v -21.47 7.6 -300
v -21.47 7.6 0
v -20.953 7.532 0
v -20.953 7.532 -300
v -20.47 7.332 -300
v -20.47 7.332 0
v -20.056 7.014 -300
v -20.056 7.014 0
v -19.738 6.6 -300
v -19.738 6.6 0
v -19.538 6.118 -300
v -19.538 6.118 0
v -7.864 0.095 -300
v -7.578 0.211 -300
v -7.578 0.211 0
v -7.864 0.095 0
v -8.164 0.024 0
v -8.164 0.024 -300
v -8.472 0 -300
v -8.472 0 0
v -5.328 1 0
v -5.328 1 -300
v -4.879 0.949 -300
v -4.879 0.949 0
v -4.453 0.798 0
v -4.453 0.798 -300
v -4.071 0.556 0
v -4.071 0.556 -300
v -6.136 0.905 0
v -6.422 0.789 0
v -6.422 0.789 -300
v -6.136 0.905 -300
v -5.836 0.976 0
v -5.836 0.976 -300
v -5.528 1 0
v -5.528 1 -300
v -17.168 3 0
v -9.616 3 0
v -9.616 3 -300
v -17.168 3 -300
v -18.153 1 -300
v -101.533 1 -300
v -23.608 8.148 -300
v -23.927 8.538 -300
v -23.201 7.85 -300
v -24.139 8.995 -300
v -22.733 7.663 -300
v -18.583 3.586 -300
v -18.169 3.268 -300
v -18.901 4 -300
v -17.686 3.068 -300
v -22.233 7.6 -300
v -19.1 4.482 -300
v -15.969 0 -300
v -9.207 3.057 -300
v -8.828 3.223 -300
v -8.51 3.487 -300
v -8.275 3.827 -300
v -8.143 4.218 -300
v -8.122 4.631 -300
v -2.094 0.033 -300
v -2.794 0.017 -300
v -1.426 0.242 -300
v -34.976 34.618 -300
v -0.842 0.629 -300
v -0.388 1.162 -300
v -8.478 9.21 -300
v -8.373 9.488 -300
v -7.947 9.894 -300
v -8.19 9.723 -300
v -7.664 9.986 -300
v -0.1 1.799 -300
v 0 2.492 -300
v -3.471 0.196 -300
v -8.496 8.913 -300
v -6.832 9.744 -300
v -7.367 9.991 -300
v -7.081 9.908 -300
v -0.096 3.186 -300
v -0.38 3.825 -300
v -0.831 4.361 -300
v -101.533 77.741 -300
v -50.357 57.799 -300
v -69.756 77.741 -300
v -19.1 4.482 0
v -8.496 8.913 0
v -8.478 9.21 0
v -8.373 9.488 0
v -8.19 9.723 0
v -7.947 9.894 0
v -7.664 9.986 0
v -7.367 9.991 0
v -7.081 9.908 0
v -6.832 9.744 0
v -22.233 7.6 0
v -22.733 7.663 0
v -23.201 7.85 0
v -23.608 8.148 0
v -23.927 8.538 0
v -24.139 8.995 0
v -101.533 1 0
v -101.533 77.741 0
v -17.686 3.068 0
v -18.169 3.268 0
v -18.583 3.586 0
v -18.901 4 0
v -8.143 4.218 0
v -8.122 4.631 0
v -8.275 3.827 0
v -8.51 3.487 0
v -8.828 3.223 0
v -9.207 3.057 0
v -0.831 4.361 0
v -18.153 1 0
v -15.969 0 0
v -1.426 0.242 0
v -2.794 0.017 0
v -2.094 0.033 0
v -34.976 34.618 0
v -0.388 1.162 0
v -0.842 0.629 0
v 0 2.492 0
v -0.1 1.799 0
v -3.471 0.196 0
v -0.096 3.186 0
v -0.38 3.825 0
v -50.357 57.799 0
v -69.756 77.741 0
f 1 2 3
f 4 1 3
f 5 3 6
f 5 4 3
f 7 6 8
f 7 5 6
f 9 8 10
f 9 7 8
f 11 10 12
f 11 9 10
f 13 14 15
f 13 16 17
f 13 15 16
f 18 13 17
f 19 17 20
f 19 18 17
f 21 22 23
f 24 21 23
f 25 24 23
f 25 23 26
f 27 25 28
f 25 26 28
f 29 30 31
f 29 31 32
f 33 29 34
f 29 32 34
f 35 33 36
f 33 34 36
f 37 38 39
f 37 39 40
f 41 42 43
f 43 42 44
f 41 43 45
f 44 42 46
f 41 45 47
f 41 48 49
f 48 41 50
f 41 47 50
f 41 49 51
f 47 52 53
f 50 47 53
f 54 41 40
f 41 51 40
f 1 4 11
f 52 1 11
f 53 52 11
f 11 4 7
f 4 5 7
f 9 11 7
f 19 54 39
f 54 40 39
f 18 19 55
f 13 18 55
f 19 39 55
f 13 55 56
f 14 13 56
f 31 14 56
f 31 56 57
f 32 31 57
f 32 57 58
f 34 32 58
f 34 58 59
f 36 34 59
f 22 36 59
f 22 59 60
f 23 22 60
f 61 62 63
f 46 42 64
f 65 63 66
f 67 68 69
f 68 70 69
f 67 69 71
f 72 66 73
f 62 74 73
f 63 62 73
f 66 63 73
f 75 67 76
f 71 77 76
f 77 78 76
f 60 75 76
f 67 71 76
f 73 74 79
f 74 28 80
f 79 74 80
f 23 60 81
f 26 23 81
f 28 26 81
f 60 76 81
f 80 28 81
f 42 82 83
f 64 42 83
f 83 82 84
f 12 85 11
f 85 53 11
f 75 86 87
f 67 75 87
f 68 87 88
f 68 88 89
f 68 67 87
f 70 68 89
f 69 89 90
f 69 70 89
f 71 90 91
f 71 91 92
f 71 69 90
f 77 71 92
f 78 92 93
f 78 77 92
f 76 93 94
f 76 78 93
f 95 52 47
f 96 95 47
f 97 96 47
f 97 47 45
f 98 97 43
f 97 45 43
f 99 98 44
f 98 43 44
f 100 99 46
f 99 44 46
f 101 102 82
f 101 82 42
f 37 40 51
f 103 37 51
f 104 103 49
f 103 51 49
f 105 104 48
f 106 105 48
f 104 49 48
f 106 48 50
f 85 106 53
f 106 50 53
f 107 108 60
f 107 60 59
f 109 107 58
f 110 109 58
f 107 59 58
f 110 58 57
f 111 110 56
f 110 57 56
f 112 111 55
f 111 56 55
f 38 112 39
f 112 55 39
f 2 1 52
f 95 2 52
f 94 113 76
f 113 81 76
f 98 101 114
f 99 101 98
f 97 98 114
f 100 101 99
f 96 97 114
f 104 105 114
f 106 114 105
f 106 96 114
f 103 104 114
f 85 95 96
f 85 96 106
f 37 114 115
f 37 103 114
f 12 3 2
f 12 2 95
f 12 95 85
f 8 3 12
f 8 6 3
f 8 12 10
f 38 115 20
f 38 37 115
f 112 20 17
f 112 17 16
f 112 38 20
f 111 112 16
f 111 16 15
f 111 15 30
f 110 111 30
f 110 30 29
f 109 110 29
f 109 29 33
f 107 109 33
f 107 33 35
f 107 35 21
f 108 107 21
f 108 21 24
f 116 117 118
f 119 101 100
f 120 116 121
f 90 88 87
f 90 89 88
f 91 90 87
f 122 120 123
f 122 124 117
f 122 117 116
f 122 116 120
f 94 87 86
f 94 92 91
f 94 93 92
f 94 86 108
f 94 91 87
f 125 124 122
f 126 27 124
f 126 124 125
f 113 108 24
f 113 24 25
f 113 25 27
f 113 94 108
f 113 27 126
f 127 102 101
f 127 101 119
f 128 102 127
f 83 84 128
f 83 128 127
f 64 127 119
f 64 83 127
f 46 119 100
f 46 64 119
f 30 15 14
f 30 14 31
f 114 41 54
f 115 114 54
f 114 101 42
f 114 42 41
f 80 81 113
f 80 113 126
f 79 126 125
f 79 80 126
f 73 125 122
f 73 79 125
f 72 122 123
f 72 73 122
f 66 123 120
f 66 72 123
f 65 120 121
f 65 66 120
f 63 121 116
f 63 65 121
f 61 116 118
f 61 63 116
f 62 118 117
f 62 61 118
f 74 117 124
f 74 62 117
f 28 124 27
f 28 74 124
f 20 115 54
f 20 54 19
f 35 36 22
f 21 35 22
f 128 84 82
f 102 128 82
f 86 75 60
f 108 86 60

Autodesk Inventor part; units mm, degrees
ref_plane "YZ Plane" through (0, 0, 0) normal (1, 0, 0) x (0, 1, 0)
ref_plane "XZ Plane" through (0, 0, 0) normal (0, 1, 0) x (-1, 0, 0)
ref_plane "XY Plane" through (0, 0, 0) normal (0, 0, 1) x (1, 0, 0)
sketch "草圖3" plane through (0, 0, 0) normal (0, 1, 0) x (-1, 0, 0)
  line L0 (0, 0) -> (0, -300)
  dimension "d15" = 300
sketch "草圖1" plane through (0, 0, 0) normal (0, 0, 1) x (1, 0, 0)
  line L0 (0, 0) -> (-9.6483, 0) construction
  line L1 (0, 0) -> (0, 9.3404) construction
  line L2 (-8.1216, 4.6307) -> (-8.4962, 8.9128)
  arc A0 (-6.8323, 9.7444) -> (-8.4962, 8.9128) centre (-7.5, 9) ccw
  line L3 (-6.8323, 9.7444) -> (-0.8307, 4.361)
  arc A1 (-4.5, 1) -> (-0.8307, 4.361) centre (-2.5, 2.5) ccw
  line L4 (-4.5, 1) -> (-6, 1)
  line L5 (-6, 1) -> (-8, 0)
  line L6 (-8, 0) -> (-15.9689, 0)
  line L7 (-15.9689, 0) -> (-18.1528, 1)
  line L8 (-18.1528, 1) -> (-101.5326, 1)
  line L9 (-9.6159, 3) -> (-17.1685, 3)
  arc A2 (-9.6159, 3) -> (-8.1216, 4.6307) centre (-9.6159, 4.5) ccw
  line L10 (-19.1004, 4.4824) -> (-19.5385, 6.1176)
  line L11 (-21.4704, 7.5999) -> (-22.2327, 7.5999)
  arc A3 (-19.5385, 6.1176) -> (-21.4704, 7.5999) centre (-21.4704, 5.5999) ccw
  arc A4 (-19.1004, 4.4824) -> (-17.1685, 3) centre (-17.1685, 5) ccw
  line L12 (-14, 16.4786) -> (-11, 16.4786) construction
  line L13 (-11, 16.4786) -> (-11, 4.7787) construction
  line L14 (-11, 4.7787) -> (-14, 4.7787) construction
  line L15 (-14, 4.7787) -> (-14, 16.4786) construction
  arc A5 (-24.139, 8.995) -> (-69.7556, 77.7407) centre (-167.1146, -36.3699) ccw
  arc A6 (-24.139, 8.995) -> (-22.2327, 7.5999) centre (-22.2327, 9.5999) ccw
  line L16 (-69.7556, 77.7407) -> (-101.5326, 77.7407)
  line L17 (-101.5326, 77.7407) -> (-101.5326, 1)
  point P0 (-23.7038, 7.5999)
  point P1 (-12.5, 4.7787)
  dimension "d0" = 10
  dimension "d4" = 1
  dimension "d5" = 2.5
  dimension "d8" = 1.5
  dimension "d9" = 2
  dimension "d10" = 2
  dimension "d11" = 105
  dimension "d13" = 3
  dimension "d14" = 10
  dimension "d20" = 5
  dimension "d21" = 85
  dimension "d22" = 3
  dimension "d24" = 150
  dimension "d25" = 2
  dimension "d26" = 2
  dimension "d27" = 7.9689
  dimension "d28" = 2
  dimension "d29" = 1.5
sweep "掃掠1" add profiles "草圖1" path "草圖3"
fillet "圓角1" radius 2 3 edges at (-6, 1, -150) (-4.5, 1, -150) (-8, 0, -150)
properties part number "0 零件"
